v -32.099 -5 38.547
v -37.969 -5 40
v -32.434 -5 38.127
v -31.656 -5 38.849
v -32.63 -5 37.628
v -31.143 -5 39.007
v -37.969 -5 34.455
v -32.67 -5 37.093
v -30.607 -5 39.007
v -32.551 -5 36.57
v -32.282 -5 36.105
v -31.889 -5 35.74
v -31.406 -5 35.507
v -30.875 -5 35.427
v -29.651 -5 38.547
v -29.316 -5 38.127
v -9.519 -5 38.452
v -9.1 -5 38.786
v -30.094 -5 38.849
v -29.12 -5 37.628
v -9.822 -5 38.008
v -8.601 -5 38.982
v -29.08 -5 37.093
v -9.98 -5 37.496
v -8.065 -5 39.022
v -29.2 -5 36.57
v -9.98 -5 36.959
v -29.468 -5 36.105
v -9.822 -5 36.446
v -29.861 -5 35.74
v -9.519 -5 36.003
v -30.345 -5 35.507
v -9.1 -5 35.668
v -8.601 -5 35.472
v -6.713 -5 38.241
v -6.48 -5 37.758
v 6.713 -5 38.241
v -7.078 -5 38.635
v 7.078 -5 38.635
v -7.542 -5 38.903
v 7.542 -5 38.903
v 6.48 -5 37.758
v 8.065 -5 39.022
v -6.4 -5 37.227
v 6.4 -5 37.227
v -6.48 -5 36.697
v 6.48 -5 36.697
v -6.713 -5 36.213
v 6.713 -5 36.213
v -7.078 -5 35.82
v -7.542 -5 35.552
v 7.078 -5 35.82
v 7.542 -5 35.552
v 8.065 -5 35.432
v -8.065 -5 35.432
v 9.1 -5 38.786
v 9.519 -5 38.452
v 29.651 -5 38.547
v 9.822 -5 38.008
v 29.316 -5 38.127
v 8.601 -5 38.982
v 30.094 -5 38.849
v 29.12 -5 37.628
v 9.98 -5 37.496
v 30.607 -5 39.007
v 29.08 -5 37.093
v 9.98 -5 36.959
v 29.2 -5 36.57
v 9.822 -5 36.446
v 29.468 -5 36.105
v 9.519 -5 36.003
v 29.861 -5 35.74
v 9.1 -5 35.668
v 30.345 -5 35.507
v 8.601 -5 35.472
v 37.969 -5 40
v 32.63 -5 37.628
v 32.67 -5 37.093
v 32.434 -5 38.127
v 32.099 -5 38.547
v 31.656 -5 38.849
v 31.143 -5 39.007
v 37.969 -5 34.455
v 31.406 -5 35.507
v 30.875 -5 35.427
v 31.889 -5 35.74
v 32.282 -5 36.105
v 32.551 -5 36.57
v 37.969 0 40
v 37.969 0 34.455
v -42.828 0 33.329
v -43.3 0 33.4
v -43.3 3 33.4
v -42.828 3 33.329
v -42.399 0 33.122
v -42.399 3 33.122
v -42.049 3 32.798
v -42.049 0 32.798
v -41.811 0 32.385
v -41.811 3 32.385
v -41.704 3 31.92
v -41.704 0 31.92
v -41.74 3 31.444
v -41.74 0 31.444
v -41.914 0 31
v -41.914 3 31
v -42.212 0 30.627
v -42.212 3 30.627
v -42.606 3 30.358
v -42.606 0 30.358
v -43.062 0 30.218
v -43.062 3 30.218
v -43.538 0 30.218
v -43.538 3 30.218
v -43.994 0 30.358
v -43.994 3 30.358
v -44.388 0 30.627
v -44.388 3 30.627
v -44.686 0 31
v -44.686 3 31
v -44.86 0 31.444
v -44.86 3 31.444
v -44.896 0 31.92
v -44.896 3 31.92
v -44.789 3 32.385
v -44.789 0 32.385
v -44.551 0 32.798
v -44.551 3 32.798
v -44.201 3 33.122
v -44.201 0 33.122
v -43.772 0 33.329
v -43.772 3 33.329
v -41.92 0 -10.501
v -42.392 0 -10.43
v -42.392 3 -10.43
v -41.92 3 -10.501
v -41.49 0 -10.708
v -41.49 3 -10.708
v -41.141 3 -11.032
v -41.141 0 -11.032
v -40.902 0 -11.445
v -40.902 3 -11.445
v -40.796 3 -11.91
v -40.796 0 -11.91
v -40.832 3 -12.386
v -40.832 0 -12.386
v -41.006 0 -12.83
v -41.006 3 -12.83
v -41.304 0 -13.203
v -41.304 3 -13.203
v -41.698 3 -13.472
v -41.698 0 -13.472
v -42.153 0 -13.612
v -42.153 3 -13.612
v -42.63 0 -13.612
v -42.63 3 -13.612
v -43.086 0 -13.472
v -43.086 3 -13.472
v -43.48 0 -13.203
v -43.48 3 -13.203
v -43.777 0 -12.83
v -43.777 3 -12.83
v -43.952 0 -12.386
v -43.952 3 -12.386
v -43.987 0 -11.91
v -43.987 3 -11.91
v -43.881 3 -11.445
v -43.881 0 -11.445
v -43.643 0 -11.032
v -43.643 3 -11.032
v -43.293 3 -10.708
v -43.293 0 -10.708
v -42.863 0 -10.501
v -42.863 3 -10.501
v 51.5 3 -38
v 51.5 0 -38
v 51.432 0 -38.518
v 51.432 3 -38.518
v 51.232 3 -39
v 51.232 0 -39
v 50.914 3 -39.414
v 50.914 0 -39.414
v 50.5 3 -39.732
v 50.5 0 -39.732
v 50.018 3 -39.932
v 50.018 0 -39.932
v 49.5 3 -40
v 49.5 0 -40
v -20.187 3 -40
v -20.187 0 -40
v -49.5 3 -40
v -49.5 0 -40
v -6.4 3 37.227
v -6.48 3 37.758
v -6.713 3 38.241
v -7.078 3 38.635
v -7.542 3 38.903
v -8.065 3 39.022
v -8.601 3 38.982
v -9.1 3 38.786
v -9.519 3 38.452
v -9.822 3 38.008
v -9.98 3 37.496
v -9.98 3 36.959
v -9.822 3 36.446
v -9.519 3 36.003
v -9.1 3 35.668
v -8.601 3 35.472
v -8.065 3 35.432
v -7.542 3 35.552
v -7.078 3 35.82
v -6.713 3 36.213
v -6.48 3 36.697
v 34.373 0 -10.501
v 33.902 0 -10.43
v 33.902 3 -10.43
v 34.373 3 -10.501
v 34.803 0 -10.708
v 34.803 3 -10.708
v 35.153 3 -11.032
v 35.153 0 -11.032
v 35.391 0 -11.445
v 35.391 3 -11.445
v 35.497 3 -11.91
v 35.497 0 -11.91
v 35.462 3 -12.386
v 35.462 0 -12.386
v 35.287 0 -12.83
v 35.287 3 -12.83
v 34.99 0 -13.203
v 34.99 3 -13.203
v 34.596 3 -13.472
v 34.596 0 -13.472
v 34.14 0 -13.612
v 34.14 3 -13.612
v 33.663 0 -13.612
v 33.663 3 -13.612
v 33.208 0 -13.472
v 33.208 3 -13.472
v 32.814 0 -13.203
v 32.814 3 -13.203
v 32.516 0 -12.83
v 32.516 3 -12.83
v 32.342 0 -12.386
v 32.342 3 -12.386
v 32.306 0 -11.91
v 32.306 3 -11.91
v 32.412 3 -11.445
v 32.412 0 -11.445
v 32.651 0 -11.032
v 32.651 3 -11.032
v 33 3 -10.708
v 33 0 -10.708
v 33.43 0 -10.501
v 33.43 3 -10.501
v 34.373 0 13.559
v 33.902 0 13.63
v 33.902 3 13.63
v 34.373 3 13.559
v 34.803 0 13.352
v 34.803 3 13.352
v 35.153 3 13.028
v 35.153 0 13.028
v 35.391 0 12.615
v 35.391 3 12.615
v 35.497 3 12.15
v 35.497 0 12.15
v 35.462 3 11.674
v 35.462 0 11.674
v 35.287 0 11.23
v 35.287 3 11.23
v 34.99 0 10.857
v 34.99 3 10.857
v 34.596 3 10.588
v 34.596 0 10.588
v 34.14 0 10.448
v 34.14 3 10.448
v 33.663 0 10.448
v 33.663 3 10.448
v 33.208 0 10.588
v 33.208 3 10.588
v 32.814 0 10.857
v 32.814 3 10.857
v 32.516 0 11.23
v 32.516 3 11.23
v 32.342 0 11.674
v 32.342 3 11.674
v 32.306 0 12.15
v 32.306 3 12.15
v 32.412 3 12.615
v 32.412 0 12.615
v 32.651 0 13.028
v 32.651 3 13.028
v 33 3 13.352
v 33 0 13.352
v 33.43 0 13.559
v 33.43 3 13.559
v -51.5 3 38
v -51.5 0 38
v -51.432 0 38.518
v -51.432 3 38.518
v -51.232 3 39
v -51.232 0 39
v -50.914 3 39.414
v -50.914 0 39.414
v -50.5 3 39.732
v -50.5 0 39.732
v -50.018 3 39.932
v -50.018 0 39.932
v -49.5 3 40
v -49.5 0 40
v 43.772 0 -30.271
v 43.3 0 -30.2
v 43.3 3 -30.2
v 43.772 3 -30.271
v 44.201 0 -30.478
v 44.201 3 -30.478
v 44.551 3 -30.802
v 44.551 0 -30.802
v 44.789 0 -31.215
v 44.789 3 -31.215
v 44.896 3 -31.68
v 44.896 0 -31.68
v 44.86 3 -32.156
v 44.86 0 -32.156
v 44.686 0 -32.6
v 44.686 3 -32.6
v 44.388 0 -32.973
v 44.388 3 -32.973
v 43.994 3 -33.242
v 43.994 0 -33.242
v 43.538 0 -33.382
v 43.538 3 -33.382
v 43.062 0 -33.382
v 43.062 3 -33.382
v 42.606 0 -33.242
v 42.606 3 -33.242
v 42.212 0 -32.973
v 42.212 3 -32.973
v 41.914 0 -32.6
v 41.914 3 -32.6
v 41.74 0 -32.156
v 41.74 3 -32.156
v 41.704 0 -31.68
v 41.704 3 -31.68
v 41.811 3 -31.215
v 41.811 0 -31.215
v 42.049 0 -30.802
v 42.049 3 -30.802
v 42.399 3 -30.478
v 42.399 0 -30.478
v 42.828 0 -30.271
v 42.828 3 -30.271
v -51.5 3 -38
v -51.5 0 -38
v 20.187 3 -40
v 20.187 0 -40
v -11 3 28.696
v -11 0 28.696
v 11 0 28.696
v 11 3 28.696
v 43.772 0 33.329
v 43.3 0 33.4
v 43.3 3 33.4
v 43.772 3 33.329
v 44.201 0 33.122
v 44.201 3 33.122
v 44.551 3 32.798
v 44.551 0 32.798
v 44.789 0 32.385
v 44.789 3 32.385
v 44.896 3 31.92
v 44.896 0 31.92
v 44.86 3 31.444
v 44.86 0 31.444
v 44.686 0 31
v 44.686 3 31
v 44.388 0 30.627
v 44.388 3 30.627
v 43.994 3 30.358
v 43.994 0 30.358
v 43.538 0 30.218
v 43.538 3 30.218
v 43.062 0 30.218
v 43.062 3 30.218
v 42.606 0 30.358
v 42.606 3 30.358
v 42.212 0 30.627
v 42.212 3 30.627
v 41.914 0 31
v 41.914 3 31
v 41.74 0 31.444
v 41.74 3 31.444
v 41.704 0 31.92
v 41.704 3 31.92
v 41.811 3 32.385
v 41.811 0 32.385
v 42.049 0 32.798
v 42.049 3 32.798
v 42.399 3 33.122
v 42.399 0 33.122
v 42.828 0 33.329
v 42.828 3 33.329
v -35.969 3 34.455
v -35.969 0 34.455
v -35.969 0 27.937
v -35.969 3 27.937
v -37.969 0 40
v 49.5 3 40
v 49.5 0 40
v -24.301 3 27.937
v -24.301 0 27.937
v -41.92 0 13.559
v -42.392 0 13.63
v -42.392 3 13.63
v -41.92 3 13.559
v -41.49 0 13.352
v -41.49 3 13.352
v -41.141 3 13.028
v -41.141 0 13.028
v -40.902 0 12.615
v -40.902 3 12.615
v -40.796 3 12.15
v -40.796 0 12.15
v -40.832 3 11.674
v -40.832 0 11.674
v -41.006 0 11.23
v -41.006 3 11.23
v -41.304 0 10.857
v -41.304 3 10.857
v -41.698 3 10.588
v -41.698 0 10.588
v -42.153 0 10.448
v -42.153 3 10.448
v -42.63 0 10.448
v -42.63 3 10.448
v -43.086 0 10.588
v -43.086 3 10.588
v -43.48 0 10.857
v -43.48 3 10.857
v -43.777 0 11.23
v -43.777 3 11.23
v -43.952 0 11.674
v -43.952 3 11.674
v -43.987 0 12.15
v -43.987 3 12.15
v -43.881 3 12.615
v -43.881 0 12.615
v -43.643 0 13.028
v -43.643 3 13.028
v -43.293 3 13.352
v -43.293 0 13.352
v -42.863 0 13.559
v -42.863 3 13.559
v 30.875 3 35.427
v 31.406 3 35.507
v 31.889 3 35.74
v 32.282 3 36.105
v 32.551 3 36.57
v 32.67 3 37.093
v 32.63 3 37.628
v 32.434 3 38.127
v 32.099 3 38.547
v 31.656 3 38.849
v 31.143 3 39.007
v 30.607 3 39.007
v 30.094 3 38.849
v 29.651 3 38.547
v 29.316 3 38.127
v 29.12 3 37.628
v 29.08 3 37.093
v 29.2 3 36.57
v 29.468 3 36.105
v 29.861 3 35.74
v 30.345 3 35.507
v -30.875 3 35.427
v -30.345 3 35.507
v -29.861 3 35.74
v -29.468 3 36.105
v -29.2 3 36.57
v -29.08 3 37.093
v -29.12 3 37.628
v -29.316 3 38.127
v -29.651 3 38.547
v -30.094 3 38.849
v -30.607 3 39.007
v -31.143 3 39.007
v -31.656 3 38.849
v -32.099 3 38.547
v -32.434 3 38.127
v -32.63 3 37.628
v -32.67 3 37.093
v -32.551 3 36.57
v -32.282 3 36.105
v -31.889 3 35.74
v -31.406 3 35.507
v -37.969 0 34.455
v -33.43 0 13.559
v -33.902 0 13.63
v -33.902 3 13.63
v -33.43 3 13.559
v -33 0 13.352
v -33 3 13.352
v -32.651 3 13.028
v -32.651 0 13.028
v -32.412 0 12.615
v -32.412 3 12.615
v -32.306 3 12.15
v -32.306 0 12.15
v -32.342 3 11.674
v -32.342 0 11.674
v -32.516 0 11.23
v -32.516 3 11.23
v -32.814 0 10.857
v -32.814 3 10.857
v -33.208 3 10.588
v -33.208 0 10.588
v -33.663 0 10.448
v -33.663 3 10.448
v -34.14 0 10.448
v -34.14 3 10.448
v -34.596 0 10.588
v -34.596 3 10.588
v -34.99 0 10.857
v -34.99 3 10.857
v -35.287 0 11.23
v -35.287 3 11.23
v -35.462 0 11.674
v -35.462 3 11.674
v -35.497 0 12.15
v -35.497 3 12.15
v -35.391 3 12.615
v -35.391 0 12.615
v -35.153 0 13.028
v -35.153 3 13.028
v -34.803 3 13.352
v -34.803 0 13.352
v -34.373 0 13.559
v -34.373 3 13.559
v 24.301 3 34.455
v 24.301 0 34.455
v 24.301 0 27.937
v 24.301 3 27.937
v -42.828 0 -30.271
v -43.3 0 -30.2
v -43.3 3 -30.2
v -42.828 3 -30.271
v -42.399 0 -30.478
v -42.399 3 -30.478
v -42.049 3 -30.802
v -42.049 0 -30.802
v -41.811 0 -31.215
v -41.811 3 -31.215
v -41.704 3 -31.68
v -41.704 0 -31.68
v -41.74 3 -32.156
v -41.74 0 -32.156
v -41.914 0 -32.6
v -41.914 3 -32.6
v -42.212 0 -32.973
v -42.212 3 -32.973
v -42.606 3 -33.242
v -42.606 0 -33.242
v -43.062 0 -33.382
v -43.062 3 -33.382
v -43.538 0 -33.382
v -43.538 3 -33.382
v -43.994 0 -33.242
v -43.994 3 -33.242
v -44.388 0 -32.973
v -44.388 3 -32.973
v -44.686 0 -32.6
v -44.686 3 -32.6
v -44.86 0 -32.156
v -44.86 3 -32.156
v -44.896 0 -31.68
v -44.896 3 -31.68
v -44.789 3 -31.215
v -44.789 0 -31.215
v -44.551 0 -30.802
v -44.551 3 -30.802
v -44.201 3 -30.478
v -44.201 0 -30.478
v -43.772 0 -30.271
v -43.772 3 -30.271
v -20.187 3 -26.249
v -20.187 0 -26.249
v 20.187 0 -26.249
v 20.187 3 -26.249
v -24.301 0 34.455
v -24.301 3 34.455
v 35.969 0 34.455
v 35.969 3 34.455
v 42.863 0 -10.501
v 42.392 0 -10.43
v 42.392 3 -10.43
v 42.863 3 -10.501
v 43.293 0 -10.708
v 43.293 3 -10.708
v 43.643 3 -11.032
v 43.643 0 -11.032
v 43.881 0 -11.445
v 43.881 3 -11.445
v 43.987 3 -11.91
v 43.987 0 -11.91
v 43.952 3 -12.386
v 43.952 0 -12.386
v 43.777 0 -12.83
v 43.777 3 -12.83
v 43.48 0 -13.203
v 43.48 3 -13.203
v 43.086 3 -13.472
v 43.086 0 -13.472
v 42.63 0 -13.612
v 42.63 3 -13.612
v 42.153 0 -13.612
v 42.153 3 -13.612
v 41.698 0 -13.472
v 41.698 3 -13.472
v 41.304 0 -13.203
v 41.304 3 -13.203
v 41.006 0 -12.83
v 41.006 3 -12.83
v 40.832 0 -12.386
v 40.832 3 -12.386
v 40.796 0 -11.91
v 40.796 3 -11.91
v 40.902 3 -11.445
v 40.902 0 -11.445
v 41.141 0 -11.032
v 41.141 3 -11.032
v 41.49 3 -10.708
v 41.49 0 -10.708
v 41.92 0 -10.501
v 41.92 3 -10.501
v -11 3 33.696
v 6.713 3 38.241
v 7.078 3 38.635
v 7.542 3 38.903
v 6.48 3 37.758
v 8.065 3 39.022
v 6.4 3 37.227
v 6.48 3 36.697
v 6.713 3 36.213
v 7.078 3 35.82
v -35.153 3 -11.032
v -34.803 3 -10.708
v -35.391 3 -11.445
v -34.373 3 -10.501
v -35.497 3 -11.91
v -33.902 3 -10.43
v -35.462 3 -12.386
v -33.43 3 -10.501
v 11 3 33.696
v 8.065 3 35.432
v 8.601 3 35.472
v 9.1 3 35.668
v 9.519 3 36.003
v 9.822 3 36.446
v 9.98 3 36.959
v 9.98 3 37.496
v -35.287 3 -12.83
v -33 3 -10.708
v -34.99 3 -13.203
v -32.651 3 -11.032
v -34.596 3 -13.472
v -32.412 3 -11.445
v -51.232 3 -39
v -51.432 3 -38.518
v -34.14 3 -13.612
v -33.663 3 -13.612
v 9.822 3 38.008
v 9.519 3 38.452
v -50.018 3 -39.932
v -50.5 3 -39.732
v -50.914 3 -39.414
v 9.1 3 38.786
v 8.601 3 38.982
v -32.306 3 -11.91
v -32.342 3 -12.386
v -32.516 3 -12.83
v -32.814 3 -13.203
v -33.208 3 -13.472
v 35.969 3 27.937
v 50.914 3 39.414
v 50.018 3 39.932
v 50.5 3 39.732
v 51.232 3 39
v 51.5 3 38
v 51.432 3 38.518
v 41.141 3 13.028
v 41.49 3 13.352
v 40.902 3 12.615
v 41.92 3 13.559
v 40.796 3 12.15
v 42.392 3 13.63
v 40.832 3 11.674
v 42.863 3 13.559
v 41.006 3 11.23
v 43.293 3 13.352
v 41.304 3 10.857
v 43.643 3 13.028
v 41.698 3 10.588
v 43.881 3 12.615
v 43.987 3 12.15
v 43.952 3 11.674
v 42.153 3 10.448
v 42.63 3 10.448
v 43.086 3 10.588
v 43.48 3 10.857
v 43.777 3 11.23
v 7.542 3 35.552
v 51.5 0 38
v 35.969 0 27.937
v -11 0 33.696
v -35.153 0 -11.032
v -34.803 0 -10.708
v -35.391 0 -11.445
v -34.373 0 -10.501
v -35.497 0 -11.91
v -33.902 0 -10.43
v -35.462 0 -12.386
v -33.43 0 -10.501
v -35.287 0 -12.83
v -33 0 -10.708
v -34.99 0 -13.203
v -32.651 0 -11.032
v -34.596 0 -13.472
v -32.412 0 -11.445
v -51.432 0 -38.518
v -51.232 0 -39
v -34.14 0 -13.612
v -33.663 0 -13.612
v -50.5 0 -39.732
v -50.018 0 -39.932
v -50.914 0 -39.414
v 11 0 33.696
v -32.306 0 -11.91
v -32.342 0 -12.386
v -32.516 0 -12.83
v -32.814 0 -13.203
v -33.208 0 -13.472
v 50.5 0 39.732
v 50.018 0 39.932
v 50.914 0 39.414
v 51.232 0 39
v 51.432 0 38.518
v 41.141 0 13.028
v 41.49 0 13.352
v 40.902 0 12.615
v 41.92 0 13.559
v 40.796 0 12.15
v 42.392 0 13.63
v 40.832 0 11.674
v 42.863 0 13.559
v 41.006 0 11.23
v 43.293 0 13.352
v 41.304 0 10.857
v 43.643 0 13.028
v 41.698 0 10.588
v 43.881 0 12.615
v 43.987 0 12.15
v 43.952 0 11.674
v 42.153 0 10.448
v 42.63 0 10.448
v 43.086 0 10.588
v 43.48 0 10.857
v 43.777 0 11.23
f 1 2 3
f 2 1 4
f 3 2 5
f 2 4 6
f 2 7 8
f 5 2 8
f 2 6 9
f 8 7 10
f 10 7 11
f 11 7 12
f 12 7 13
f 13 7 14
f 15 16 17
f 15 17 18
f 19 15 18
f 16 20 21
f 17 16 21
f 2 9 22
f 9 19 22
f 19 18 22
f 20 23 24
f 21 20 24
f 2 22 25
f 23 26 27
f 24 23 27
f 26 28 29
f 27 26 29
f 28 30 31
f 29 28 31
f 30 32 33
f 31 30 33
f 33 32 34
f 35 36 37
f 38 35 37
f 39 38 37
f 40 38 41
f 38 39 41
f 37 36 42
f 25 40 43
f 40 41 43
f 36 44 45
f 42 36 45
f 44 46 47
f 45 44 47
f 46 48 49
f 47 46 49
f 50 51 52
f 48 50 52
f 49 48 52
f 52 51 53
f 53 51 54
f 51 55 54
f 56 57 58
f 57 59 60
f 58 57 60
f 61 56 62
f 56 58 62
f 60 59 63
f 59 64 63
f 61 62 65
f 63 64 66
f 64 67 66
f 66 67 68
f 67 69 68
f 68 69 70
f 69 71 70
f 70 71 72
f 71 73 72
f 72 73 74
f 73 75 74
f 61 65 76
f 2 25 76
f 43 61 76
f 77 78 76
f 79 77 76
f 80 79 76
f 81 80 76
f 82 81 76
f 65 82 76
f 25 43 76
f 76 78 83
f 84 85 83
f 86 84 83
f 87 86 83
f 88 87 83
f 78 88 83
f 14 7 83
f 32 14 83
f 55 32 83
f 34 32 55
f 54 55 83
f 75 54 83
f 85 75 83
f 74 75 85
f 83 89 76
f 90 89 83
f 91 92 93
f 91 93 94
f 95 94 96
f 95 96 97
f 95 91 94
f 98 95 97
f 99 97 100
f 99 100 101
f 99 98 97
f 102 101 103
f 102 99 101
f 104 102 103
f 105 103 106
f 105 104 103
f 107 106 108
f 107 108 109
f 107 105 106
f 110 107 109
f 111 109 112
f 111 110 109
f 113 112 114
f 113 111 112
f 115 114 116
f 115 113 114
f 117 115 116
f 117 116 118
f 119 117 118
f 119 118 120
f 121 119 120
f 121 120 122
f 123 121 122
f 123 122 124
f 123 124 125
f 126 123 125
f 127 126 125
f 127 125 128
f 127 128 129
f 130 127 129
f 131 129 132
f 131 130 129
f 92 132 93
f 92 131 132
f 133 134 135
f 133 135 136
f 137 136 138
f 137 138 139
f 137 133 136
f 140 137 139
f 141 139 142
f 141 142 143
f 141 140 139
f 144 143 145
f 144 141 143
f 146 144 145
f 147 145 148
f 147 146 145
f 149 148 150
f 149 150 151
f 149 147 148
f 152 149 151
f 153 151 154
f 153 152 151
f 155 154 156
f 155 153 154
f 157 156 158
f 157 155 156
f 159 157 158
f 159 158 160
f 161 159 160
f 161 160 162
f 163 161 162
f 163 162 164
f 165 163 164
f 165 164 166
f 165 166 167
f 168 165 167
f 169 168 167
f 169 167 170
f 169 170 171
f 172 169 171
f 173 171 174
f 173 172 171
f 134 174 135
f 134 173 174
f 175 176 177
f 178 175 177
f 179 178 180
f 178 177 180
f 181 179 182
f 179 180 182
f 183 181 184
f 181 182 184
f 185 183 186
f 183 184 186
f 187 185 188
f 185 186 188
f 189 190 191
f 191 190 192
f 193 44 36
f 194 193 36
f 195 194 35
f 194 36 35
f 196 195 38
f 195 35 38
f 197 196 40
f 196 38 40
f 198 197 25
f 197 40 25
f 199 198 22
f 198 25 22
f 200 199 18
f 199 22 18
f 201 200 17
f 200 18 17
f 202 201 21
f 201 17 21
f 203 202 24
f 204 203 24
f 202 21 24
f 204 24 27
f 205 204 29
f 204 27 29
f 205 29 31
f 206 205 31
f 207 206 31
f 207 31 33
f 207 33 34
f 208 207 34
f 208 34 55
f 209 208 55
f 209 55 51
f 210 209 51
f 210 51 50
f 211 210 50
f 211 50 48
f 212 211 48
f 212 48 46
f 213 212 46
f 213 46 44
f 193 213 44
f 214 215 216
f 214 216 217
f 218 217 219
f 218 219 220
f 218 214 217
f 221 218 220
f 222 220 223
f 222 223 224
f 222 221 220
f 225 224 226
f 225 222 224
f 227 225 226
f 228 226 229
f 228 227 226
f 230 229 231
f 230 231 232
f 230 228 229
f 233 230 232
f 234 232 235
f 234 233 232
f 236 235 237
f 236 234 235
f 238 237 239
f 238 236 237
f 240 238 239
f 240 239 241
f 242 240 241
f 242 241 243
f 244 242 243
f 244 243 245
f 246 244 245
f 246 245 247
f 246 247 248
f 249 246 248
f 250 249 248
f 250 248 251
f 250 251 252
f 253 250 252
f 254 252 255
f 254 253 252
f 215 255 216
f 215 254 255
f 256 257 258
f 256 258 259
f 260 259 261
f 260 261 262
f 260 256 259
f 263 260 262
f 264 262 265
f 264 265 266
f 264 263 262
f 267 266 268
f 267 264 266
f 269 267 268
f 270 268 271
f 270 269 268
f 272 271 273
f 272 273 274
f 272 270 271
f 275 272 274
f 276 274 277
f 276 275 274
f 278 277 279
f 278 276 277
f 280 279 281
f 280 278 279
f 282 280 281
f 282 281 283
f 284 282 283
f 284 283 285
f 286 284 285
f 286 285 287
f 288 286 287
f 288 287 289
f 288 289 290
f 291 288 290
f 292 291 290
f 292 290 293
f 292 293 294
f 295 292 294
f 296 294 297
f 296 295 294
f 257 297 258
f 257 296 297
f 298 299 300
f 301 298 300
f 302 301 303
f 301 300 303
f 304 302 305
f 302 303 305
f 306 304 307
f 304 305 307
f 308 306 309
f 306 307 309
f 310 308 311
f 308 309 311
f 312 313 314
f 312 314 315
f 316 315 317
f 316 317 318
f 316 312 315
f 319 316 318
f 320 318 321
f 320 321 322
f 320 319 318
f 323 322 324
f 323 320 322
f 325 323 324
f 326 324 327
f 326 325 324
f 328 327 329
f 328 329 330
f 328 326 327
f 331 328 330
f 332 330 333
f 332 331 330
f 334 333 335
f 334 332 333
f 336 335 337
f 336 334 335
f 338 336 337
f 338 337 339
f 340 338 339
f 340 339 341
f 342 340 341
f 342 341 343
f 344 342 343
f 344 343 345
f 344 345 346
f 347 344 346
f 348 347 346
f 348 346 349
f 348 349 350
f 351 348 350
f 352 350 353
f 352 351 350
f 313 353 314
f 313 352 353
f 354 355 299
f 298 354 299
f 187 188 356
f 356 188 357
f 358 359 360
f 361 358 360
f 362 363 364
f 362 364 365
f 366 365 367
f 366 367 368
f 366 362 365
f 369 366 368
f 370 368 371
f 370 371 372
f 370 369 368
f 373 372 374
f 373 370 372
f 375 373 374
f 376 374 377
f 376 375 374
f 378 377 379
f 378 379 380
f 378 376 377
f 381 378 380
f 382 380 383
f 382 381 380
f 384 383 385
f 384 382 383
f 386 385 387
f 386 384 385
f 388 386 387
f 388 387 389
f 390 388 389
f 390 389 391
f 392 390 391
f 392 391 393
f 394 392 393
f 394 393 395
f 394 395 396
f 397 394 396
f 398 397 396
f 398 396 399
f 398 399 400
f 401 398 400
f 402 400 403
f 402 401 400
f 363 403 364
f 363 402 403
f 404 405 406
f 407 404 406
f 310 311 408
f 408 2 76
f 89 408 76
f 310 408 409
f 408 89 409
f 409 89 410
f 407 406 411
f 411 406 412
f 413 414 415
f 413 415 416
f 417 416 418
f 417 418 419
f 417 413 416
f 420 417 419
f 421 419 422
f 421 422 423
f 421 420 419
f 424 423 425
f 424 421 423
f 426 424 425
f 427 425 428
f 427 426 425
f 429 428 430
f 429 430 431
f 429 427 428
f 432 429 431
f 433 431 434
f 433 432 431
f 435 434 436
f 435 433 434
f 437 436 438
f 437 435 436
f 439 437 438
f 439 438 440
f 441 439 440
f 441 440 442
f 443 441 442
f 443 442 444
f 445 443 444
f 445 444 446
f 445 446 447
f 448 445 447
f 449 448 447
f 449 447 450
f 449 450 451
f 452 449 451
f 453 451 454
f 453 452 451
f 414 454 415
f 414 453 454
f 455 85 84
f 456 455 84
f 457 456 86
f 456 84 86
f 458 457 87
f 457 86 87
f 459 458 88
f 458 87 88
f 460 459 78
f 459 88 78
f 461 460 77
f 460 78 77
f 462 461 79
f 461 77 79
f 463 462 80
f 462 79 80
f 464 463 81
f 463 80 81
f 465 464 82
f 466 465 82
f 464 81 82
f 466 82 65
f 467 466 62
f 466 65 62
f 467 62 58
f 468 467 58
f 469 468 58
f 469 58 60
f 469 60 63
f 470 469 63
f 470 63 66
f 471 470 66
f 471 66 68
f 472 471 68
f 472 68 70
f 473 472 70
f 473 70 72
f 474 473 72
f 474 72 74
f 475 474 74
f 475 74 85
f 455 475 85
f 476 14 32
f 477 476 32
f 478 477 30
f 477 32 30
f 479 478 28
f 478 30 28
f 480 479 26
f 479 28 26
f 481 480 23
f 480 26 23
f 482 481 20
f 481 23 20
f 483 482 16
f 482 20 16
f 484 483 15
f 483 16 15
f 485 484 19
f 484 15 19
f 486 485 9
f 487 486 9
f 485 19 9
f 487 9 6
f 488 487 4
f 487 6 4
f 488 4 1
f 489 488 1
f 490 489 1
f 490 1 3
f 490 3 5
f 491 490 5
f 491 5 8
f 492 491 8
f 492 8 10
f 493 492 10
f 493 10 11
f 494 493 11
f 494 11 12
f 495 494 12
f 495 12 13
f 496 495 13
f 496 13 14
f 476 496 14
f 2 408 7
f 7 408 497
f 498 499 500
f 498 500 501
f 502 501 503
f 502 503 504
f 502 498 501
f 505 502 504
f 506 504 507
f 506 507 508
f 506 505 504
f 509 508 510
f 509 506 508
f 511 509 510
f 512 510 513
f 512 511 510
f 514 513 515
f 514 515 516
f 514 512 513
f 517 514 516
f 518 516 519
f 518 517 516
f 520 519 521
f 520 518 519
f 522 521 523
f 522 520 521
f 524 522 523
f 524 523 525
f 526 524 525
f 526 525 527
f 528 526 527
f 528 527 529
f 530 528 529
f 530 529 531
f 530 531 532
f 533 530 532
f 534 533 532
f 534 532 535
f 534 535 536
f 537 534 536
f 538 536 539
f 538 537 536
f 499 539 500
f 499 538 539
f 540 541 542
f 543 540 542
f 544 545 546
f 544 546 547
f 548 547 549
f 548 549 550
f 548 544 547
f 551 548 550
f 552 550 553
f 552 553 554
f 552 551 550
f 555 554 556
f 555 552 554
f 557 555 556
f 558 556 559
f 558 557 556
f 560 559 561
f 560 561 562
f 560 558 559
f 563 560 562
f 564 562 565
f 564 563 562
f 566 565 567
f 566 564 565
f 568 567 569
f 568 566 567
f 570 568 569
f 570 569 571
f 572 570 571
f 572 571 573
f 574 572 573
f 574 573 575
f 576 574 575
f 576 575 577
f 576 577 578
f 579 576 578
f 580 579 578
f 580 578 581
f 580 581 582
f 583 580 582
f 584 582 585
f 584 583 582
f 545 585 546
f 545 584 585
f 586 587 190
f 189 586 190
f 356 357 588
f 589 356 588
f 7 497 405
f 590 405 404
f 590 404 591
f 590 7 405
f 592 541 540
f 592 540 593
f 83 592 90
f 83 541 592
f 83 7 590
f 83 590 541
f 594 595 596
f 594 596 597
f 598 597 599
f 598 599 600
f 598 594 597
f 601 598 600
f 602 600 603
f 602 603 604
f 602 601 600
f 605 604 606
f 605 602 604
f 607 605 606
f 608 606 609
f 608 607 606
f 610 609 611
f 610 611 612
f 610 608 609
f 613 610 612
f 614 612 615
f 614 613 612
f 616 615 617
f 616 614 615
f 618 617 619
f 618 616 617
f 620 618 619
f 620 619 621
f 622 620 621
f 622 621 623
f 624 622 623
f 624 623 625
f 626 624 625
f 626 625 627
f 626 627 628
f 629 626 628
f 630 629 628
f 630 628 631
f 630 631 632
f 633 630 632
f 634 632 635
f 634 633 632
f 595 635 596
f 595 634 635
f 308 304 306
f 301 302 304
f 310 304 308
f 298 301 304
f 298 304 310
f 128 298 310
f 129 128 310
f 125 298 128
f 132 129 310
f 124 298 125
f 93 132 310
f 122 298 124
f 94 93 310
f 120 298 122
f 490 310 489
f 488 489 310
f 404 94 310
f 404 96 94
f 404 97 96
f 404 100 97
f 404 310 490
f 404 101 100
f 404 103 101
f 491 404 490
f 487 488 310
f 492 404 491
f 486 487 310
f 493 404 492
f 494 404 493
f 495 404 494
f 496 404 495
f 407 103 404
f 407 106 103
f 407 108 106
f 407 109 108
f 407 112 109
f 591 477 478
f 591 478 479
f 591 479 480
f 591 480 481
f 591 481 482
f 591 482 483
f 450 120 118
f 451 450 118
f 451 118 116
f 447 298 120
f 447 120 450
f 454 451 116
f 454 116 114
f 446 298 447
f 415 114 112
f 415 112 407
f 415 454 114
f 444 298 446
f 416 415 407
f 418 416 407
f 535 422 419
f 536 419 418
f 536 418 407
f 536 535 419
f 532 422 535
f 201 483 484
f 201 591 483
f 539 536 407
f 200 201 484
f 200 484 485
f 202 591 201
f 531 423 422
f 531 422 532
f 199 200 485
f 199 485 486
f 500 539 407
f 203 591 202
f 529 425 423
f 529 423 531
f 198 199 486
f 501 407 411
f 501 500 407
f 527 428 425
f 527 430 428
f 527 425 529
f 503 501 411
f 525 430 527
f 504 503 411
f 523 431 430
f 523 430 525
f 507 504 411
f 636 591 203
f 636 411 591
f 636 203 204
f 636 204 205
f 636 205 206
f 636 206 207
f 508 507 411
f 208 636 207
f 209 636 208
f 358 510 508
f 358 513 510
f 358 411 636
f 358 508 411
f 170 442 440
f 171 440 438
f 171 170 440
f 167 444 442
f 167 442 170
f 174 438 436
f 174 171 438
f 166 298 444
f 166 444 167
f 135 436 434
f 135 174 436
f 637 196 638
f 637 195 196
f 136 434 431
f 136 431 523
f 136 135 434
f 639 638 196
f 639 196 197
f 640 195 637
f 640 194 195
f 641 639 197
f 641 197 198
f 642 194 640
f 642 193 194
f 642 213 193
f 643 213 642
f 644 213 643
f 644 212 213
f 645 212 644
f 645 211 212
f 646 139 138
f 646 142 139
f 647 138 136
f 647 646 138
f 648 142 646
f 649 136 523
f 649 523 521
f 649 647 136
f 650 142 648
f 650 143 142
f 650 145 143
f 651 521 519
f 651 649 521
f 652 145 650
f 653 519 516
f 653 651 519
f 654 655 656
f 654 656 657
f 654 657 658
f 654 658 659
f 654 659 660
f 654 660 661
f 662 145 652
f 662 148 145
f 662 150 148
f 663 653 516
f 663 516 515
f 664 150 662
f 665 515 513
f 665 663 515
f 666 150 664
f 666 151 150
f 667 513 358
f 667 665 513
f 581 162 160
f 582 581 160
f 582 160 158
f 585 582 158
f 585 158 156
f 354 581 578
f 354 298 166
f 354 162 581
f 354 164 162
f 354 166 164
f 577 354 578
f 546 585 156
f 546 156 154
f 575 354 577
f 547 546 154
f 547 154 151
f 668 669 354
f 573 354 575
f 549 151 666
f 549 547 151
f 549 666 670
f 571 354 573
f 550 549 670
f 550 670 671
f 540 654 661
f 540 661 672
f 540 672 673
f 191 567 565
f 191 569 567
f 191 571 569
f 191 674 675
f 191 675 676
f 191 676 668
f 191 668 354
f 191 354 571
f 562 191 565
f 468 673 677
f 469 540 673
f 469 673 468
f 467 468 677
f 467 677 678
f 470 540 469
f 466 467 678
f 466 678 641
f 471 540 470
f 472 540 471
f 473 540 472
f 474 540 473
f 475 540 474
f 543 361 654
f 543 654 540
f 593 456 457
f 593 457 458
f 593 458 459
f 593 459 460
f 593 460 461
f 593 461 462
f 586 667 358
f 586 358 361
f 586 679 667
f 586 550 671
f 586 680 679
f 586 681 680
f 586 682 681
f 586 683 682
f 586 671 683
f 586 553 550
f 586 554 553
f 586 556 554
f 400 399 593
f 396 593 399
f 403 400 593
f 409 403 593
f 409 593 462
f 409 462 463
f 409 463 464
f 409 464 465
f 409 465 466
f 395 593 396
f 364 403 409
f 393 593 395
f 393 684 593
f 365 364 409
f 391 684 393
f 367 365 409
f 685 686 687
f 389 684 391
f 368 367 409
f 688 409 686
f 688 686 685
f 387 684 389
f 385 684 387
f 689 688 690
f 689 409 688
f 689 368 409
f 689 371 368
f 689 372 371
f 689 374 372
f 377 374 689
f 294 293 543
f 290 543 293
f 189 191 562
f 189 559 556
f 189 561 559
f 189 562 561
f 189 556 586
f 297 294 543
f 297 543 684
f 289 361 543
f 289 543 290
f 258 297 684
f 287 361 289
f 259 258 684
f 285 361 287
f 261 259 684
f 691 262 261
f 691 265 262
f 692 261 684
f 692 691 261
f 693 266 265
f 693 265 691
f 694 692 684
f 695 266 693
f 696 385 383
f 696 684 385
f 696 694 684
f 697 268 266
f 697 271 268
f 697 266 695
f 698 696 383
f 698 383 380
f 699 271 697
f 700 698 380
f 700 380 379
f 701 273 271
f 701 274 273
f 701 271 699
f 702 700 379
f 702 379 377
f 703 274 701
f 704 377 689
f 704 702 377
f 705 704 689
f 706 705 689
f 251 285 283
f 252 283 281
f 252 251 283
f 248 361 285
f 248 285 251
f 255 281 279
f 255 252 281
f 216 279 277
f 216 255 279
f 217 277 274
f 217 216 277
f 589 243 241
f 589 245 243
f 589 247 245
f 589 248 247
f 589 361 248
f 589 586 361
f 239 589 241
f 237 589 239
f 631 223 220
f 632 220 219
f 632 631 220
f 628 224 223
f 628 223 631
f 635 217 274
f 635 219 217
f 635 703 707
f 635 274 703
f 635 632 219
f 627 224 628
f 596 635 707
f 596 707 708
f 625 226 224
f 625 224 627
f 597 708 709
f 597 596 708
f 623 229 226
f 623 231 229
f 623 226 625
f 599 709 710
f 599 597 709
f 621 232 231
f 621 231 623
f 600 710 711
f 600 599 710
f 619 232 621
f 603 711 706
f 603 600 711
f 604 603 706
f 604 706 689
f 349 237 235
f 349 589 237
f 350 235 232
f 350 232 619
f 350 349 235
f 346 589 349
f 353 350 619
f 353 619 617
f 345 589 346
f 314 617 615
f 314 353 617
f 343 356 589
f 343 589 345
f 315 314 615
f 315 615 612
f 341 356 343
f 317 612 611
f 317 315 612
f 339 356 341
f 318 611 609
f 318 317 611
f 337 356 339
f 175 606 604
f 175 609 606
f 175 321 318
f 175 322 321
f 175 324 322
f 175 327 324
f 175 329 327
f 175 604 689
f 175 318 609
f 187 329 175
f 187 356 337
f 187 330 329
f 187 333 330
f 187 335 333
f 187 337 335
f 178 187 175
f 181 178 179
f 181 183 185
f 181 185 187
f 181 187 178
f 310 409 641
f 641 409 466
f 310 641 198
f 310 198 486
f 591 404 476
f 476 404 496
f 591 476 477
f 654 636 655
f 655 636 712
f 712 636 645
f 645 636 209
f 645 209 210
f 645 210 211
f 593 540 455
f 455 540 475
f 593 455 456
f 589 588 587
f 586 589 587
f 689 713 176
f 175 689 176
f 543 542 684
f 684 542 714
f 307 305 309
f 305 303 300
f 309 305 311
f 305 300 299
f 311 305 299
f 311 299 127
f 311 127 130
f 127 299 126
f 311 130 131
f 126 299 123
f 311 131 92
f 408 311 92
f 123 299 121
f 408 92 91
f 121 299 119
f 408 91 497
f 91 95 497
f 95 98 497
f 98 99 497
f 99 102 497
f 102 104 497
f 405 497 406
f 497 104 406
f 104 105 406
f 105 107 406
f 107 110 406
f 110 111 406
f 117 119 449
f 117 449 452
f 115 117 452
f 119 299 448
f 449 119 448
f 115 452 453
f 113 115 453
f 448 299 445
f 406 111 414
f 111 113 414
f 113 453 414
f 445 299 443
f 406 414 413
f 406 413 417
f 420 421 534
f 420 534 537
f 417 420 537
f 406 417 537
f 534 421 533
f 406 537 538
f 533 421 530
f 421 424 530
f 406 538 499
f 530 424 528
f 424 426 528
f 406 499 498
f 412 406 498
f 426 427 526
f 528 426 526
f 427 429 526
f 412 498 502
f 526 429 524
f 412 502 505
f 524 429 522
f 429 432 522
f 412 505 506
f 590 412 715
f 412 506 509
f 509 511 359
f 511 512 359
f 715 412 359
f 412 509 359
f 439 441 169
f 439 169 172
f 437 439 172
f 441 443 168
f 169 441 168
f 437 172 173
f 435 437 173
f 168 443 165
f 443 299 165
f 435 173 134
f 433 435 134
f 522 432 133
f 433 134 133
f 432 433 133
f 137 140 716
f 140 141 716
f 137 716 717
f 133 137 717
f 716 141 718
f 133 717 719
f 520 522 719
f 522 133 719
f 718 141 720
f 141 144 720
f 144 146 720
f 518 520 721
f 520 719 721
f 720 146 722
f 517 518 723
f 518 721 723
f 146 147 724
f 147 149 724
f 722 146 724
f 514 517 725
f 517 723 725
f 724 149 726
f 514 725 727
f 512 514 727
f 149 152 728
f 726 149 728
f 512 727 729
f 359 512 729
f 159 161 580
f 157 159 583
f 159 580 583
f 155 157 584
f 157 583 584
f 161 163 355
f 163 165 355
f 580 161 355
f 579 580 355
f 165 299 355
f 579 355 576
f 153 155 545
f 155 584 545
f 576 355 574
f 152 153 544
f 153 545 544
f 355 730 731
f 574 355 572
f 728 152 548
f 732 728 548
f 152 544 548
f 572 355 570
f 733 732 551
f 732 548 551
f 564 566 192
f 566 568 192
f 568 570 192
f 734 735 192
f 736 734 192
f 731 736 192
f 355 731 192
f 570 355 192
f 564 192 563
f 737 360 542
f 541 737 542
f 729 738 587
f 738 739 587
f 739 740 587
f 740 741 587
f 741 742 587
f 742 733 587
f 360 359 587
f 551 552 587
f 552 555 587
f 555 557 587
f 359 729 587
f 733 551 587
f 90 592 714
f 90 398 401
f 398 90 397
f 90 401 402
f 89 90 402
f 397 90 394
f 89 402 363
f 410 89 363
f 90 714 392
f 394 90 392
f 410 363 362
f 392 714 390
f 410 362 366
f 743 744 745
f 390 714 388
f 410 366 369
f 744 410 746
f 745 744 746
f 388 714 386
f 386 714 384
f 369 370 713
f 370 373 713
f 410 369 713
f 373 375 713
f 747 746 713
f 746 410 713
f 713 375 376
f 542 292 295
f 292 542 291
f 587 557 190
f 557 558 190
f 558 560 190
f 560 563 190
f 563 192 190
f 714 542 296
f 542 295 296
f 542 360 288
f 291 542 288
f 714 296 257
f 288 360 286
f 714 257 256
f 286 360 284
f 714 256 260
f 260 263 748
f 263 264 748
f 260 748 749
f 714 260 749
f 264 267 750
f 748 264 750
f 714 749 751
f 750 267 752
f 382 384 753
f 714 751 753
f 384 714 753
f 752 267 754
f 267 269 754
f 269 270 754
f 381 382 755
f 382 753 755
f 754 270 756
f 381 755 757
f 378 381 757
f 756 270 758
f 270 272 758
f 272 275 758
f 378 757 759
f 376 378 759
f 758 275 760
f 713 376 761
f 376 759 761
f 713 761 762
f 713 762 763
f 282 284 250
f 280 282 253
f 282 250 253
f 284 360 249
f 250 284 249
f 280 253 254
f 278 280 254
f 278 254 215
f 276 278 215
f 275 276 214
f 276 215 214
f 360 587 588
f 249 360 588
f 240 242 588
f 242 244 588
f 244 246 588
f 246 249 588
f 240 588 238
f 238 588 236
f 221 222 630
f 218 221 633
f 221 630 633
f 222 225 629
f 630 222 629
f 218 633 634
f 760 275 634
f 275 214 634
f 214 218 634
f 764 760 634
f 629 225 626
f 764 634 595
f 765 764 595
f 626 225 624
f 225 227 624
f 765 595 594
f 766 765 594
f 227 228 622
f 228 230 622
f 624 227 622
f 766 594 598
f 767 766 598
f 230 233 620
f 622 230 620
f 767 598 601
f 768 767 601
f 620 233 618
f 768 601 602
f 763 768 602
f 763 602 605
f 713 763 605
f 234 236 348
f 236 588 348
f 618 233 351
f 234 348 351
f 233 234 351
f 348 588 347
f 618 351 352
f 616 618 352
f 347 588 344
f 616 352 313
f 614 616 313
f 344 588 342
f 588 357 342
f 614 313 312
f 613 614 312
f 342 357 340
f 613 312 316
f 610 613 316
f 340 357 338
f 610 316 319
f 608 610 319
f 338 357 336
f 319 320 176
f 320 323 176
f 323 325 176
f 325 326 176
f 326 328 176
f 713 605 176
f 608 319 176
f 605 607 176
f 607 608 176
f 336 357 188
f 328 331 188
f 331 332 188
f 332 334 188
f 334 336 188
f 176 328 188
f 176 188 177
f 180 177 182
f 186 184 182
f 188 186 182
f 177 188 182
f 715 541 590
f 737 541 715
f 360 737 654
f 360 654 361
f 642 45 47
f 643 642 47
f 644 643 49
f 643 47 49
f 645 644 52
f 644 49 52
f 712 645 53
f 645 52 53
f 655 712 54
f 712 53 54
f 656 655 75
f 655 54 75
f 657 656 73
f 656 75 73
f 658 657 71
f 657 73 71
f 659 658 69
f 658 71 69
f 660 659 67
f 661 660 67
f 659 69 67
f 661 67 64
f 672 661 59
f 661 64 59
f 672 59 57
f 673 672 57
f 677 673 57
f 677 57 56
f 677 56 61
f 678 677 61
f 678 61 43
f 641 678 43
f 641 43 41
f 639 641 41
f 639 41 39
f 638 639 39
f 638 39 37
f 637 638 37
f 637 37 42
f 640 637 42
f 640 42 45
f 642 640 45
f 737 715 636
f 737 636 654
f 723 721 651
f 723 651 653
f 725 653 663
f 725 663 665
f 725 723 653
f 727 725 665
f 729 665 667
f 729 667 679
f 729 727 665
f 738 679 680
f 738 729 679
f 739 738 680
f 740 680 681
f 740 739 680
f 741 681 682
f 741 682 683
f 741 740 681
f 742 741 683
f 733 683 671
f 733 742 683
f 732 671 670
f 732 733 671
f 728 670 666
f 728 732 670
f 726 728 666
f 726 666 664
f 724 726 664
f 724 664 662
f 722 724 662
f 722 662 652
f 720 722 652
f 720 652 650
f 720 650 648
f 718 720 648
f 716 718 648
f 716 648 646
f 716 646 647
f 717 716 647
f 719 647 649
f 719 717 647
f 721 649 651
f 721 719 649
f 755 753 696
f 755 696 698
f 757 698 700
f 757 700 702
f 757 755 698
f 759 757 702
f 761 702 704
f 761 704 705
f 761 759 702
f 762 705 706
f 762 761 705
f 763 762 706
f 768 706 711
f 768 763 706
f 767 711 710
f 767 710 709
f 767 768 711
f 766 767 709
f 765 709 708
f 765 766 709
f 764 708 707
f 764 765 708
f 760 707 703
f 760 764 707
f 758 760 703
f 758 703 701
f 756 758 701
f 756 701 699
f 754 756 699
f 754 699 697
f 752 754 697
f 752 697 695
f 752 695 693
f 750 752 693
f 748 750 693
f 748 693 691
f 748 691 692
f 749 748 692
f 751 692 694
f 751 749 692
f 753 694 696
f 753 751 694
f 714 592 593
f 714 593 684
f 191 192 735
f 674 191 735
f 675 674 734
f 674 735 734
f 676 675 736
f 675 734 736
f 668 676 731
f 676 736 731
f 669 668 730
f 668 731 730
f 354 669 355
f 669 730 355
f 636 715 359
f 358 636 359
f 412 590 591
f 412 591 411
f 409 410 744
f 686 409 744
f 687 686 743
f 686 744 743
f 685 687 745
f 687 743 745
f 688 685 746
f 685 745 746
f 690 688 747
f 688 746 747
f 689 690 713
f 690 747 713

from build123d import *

# Parameters (mm, degrees)
SKETCH_1_R          = 1.6
SKETCH_1_W          = 11.667697598
SKETCH_1_H          = 6.517356375
SKETCH_1_W_2        = 22
SKETCH_1_H_2        = 5
EXTRUDE_1_DEPTH     = 3
SKETCH_2_W          = 75.93825213
SKETCH_2_H          = 5.545458332
EXTRUDE_2_DEPTH     = 8
SKETCH_3_R          = 1.8
CUT_EXTRUDE_1_DEPTH = 15


with BuildPart() as part:
    # 草图1 → 凸台-拉伸1 (new body)
    with BuildSketch(Plane(origin=(0, 0, 0), x_dir=(1, 0, 0), z_dir=(0, 1, 0))):
        with BuildLine():
            Line((-49.5, -40), (49.5, -40))
            ThreePointArc((49.5, -40), (50.914213562, -39.414213562), (51.5, -38))
            Line((51.5, -38), (51.5, 38))
            ThreePointArc((51.5, 38), (50.914213562, 39.414213562), (49.5, 40))
            Line((49.5, 40), (20.187430173, 40))
            Line((20.187430173, 40), (20.187430173, 26.249140852))
            Line((20.187430173, 26.249140852), (-20.187430173, 26.249140852))
            Line((-20.187430173, 26.249140852), (-20.187430173, 40))
            Line((-20.187430173, 40), (-49.5, 40))
            ThreePointArc((-49.5, 40), (-50.914213562, 39.414213562), (-51.5, 38))
            Line((-51.5, 38), (-51.5, -38))
            ThreePointArc((-51.5, -38), (-50.914213562, -39.414213562), (-49.5, -40))
        make_face()
        with Locations(Location((-43.3, -31.8, 0), (0, 0, 270))):
            Circle(SKETCH_1_R, mode=Mode.SUBTRACT)
        with Locations((-30.135277266, -31.195863481)):
            Rectangle(SKETCH_1_W, SKETCH_1_H, mode=Mode.SUBTRACT)
        with Locations(Location((-42.391806281, -12.03, 0), (0, 0, 270))):
            Circle(SKETCH_1_R, mode=Mode.SUBTRACT)
        with Locations(Location((-33.901806281, -12.03, 0), (0, 0, 270))):
            Circle(SKETCH_1_R, mode=Mode.SUBTRACT)
        with Locations((0, -31.19586348)):
            Rectangle(SKETCH_1_W_2, SKETCH_1_H_2, mode=Mode.SUBTRACT)
        with Locations((30.135277266, -31.195863481)):
            Rectangle(SKETCH_1_W, SKETCH_1_H, mode=Mode.SUBTRACT)
        with Locations(Location((43.3, -31.8, 0), (0, 0, 270))):
            Circle(SKETCH_1_R, mode=Mode.SUBTRACT)
        with Locations(Location((33.901806281, -12.03, 0), (0, 0, 270))):
            Circle(SKETCH_1_R, mode=Mode.SUBTRACT)
        with Locations(Location((42.391806281, -12.03, 0), (0, 0, 270))):
            Circle(SKETCH_1_R, mode=Mode.SUBTRACT)
        with Locations(Location((-42.391806281, 12.03, 0), (0, 0, 270))):
            Circle(SKETCH_1_R, mode=Mode.SUBTRACT)
        with Locations(Location((-33.901806281, 12.03, 0), (0, 0, 270))):
            Circle(SKETCH_1_R, mode=Mode.SUBTRACT)
        with Locations(Location((-43.3, 31.8, 0), (0, 0, 270))):
            Circle(SKETCH_1_R, mode=Mode.SUBTRACT)
        with Locations(Location((33.901806281, 12.03, 0), (0, 0, 270))):
            Circle(SKETCH_1_R, mode=Mode.SUBTRACT)
        with Locations(Location((42.391806281, 12.03, 0), (0, 0, 270))):
            Circle(SKETCH_1_R, mode=Mode.SUBTRACT)
        with Locations(Location((43.3, 31.8, 0), (0, 0, 270))):
            Circle(SKETCH_1_R, mode=Mode.SUBTRACT)
    extrude(amount=EXTRUDE_1_DEPTH)

    # 草图2 → 凸台-拉伸2 (add)
    with BuildSketch(Plane(origin=(0, 3, 0), x_dir=(1, 0, 0), z_dir=(0, 1, 0))):
        with Locations((0, -37.227270834)):
            Rectangle(SKETCH_2_W, SKETCH_2_H)
    extrude(amount=-EXTRUDE_2_DEPTH)

    # 草图3 → 切除-拉伸1 (cut)
    with BuildSketch(Plane(origin=(0, -5, 0), x_dir=(-1, 0, 0), z_dir=(0, -1, 0))):
        with Locations(Location((30.875113943, -37.227270834, 0), (0, 0, 90))):
            Circle(SKETCH_3_R)
        with BuildLine():
            ThreePointArc((10, -37.227270834), (8.2, -35.427270834), (6.4, -37.227270834))
            Line((6.4, -37.227270834), (10, -37.227270834))
        make_face()
        with BuildLine():
            Line((10, -37.227270834), (6.4, -37.227270834))
            ThreePointArc((6.4, -37.227270834), (8.2, -39.027270834), (10, -37.227270834))
        make_face()
        with BuildLine():
            ThreePointArc((-10, -37.227270834), (-8.2, -39.027270834), (-6.4, -37.227270834))
            Line((-6.4, -37.227270834), (-10, -37.227270834))
        make_face()
        with BuildLine():
            Line((-10, -37.227270834), (-6.4, -37.227270834))
            ThreePointArc((-6.4, -37.227270834), (-8.2, -35.427270834), (-10, -37.227270834))
        make_face()
        with Locations(Location((-30.875113943, -37.227270834, 0), (0, 0, 90))):
            Circle(SKETCH_3_R)
    extrude(amount=-CUT_EXTRUDE_1_DEPTH, mode=Mode.SUBTRACT)


solid = part.part
